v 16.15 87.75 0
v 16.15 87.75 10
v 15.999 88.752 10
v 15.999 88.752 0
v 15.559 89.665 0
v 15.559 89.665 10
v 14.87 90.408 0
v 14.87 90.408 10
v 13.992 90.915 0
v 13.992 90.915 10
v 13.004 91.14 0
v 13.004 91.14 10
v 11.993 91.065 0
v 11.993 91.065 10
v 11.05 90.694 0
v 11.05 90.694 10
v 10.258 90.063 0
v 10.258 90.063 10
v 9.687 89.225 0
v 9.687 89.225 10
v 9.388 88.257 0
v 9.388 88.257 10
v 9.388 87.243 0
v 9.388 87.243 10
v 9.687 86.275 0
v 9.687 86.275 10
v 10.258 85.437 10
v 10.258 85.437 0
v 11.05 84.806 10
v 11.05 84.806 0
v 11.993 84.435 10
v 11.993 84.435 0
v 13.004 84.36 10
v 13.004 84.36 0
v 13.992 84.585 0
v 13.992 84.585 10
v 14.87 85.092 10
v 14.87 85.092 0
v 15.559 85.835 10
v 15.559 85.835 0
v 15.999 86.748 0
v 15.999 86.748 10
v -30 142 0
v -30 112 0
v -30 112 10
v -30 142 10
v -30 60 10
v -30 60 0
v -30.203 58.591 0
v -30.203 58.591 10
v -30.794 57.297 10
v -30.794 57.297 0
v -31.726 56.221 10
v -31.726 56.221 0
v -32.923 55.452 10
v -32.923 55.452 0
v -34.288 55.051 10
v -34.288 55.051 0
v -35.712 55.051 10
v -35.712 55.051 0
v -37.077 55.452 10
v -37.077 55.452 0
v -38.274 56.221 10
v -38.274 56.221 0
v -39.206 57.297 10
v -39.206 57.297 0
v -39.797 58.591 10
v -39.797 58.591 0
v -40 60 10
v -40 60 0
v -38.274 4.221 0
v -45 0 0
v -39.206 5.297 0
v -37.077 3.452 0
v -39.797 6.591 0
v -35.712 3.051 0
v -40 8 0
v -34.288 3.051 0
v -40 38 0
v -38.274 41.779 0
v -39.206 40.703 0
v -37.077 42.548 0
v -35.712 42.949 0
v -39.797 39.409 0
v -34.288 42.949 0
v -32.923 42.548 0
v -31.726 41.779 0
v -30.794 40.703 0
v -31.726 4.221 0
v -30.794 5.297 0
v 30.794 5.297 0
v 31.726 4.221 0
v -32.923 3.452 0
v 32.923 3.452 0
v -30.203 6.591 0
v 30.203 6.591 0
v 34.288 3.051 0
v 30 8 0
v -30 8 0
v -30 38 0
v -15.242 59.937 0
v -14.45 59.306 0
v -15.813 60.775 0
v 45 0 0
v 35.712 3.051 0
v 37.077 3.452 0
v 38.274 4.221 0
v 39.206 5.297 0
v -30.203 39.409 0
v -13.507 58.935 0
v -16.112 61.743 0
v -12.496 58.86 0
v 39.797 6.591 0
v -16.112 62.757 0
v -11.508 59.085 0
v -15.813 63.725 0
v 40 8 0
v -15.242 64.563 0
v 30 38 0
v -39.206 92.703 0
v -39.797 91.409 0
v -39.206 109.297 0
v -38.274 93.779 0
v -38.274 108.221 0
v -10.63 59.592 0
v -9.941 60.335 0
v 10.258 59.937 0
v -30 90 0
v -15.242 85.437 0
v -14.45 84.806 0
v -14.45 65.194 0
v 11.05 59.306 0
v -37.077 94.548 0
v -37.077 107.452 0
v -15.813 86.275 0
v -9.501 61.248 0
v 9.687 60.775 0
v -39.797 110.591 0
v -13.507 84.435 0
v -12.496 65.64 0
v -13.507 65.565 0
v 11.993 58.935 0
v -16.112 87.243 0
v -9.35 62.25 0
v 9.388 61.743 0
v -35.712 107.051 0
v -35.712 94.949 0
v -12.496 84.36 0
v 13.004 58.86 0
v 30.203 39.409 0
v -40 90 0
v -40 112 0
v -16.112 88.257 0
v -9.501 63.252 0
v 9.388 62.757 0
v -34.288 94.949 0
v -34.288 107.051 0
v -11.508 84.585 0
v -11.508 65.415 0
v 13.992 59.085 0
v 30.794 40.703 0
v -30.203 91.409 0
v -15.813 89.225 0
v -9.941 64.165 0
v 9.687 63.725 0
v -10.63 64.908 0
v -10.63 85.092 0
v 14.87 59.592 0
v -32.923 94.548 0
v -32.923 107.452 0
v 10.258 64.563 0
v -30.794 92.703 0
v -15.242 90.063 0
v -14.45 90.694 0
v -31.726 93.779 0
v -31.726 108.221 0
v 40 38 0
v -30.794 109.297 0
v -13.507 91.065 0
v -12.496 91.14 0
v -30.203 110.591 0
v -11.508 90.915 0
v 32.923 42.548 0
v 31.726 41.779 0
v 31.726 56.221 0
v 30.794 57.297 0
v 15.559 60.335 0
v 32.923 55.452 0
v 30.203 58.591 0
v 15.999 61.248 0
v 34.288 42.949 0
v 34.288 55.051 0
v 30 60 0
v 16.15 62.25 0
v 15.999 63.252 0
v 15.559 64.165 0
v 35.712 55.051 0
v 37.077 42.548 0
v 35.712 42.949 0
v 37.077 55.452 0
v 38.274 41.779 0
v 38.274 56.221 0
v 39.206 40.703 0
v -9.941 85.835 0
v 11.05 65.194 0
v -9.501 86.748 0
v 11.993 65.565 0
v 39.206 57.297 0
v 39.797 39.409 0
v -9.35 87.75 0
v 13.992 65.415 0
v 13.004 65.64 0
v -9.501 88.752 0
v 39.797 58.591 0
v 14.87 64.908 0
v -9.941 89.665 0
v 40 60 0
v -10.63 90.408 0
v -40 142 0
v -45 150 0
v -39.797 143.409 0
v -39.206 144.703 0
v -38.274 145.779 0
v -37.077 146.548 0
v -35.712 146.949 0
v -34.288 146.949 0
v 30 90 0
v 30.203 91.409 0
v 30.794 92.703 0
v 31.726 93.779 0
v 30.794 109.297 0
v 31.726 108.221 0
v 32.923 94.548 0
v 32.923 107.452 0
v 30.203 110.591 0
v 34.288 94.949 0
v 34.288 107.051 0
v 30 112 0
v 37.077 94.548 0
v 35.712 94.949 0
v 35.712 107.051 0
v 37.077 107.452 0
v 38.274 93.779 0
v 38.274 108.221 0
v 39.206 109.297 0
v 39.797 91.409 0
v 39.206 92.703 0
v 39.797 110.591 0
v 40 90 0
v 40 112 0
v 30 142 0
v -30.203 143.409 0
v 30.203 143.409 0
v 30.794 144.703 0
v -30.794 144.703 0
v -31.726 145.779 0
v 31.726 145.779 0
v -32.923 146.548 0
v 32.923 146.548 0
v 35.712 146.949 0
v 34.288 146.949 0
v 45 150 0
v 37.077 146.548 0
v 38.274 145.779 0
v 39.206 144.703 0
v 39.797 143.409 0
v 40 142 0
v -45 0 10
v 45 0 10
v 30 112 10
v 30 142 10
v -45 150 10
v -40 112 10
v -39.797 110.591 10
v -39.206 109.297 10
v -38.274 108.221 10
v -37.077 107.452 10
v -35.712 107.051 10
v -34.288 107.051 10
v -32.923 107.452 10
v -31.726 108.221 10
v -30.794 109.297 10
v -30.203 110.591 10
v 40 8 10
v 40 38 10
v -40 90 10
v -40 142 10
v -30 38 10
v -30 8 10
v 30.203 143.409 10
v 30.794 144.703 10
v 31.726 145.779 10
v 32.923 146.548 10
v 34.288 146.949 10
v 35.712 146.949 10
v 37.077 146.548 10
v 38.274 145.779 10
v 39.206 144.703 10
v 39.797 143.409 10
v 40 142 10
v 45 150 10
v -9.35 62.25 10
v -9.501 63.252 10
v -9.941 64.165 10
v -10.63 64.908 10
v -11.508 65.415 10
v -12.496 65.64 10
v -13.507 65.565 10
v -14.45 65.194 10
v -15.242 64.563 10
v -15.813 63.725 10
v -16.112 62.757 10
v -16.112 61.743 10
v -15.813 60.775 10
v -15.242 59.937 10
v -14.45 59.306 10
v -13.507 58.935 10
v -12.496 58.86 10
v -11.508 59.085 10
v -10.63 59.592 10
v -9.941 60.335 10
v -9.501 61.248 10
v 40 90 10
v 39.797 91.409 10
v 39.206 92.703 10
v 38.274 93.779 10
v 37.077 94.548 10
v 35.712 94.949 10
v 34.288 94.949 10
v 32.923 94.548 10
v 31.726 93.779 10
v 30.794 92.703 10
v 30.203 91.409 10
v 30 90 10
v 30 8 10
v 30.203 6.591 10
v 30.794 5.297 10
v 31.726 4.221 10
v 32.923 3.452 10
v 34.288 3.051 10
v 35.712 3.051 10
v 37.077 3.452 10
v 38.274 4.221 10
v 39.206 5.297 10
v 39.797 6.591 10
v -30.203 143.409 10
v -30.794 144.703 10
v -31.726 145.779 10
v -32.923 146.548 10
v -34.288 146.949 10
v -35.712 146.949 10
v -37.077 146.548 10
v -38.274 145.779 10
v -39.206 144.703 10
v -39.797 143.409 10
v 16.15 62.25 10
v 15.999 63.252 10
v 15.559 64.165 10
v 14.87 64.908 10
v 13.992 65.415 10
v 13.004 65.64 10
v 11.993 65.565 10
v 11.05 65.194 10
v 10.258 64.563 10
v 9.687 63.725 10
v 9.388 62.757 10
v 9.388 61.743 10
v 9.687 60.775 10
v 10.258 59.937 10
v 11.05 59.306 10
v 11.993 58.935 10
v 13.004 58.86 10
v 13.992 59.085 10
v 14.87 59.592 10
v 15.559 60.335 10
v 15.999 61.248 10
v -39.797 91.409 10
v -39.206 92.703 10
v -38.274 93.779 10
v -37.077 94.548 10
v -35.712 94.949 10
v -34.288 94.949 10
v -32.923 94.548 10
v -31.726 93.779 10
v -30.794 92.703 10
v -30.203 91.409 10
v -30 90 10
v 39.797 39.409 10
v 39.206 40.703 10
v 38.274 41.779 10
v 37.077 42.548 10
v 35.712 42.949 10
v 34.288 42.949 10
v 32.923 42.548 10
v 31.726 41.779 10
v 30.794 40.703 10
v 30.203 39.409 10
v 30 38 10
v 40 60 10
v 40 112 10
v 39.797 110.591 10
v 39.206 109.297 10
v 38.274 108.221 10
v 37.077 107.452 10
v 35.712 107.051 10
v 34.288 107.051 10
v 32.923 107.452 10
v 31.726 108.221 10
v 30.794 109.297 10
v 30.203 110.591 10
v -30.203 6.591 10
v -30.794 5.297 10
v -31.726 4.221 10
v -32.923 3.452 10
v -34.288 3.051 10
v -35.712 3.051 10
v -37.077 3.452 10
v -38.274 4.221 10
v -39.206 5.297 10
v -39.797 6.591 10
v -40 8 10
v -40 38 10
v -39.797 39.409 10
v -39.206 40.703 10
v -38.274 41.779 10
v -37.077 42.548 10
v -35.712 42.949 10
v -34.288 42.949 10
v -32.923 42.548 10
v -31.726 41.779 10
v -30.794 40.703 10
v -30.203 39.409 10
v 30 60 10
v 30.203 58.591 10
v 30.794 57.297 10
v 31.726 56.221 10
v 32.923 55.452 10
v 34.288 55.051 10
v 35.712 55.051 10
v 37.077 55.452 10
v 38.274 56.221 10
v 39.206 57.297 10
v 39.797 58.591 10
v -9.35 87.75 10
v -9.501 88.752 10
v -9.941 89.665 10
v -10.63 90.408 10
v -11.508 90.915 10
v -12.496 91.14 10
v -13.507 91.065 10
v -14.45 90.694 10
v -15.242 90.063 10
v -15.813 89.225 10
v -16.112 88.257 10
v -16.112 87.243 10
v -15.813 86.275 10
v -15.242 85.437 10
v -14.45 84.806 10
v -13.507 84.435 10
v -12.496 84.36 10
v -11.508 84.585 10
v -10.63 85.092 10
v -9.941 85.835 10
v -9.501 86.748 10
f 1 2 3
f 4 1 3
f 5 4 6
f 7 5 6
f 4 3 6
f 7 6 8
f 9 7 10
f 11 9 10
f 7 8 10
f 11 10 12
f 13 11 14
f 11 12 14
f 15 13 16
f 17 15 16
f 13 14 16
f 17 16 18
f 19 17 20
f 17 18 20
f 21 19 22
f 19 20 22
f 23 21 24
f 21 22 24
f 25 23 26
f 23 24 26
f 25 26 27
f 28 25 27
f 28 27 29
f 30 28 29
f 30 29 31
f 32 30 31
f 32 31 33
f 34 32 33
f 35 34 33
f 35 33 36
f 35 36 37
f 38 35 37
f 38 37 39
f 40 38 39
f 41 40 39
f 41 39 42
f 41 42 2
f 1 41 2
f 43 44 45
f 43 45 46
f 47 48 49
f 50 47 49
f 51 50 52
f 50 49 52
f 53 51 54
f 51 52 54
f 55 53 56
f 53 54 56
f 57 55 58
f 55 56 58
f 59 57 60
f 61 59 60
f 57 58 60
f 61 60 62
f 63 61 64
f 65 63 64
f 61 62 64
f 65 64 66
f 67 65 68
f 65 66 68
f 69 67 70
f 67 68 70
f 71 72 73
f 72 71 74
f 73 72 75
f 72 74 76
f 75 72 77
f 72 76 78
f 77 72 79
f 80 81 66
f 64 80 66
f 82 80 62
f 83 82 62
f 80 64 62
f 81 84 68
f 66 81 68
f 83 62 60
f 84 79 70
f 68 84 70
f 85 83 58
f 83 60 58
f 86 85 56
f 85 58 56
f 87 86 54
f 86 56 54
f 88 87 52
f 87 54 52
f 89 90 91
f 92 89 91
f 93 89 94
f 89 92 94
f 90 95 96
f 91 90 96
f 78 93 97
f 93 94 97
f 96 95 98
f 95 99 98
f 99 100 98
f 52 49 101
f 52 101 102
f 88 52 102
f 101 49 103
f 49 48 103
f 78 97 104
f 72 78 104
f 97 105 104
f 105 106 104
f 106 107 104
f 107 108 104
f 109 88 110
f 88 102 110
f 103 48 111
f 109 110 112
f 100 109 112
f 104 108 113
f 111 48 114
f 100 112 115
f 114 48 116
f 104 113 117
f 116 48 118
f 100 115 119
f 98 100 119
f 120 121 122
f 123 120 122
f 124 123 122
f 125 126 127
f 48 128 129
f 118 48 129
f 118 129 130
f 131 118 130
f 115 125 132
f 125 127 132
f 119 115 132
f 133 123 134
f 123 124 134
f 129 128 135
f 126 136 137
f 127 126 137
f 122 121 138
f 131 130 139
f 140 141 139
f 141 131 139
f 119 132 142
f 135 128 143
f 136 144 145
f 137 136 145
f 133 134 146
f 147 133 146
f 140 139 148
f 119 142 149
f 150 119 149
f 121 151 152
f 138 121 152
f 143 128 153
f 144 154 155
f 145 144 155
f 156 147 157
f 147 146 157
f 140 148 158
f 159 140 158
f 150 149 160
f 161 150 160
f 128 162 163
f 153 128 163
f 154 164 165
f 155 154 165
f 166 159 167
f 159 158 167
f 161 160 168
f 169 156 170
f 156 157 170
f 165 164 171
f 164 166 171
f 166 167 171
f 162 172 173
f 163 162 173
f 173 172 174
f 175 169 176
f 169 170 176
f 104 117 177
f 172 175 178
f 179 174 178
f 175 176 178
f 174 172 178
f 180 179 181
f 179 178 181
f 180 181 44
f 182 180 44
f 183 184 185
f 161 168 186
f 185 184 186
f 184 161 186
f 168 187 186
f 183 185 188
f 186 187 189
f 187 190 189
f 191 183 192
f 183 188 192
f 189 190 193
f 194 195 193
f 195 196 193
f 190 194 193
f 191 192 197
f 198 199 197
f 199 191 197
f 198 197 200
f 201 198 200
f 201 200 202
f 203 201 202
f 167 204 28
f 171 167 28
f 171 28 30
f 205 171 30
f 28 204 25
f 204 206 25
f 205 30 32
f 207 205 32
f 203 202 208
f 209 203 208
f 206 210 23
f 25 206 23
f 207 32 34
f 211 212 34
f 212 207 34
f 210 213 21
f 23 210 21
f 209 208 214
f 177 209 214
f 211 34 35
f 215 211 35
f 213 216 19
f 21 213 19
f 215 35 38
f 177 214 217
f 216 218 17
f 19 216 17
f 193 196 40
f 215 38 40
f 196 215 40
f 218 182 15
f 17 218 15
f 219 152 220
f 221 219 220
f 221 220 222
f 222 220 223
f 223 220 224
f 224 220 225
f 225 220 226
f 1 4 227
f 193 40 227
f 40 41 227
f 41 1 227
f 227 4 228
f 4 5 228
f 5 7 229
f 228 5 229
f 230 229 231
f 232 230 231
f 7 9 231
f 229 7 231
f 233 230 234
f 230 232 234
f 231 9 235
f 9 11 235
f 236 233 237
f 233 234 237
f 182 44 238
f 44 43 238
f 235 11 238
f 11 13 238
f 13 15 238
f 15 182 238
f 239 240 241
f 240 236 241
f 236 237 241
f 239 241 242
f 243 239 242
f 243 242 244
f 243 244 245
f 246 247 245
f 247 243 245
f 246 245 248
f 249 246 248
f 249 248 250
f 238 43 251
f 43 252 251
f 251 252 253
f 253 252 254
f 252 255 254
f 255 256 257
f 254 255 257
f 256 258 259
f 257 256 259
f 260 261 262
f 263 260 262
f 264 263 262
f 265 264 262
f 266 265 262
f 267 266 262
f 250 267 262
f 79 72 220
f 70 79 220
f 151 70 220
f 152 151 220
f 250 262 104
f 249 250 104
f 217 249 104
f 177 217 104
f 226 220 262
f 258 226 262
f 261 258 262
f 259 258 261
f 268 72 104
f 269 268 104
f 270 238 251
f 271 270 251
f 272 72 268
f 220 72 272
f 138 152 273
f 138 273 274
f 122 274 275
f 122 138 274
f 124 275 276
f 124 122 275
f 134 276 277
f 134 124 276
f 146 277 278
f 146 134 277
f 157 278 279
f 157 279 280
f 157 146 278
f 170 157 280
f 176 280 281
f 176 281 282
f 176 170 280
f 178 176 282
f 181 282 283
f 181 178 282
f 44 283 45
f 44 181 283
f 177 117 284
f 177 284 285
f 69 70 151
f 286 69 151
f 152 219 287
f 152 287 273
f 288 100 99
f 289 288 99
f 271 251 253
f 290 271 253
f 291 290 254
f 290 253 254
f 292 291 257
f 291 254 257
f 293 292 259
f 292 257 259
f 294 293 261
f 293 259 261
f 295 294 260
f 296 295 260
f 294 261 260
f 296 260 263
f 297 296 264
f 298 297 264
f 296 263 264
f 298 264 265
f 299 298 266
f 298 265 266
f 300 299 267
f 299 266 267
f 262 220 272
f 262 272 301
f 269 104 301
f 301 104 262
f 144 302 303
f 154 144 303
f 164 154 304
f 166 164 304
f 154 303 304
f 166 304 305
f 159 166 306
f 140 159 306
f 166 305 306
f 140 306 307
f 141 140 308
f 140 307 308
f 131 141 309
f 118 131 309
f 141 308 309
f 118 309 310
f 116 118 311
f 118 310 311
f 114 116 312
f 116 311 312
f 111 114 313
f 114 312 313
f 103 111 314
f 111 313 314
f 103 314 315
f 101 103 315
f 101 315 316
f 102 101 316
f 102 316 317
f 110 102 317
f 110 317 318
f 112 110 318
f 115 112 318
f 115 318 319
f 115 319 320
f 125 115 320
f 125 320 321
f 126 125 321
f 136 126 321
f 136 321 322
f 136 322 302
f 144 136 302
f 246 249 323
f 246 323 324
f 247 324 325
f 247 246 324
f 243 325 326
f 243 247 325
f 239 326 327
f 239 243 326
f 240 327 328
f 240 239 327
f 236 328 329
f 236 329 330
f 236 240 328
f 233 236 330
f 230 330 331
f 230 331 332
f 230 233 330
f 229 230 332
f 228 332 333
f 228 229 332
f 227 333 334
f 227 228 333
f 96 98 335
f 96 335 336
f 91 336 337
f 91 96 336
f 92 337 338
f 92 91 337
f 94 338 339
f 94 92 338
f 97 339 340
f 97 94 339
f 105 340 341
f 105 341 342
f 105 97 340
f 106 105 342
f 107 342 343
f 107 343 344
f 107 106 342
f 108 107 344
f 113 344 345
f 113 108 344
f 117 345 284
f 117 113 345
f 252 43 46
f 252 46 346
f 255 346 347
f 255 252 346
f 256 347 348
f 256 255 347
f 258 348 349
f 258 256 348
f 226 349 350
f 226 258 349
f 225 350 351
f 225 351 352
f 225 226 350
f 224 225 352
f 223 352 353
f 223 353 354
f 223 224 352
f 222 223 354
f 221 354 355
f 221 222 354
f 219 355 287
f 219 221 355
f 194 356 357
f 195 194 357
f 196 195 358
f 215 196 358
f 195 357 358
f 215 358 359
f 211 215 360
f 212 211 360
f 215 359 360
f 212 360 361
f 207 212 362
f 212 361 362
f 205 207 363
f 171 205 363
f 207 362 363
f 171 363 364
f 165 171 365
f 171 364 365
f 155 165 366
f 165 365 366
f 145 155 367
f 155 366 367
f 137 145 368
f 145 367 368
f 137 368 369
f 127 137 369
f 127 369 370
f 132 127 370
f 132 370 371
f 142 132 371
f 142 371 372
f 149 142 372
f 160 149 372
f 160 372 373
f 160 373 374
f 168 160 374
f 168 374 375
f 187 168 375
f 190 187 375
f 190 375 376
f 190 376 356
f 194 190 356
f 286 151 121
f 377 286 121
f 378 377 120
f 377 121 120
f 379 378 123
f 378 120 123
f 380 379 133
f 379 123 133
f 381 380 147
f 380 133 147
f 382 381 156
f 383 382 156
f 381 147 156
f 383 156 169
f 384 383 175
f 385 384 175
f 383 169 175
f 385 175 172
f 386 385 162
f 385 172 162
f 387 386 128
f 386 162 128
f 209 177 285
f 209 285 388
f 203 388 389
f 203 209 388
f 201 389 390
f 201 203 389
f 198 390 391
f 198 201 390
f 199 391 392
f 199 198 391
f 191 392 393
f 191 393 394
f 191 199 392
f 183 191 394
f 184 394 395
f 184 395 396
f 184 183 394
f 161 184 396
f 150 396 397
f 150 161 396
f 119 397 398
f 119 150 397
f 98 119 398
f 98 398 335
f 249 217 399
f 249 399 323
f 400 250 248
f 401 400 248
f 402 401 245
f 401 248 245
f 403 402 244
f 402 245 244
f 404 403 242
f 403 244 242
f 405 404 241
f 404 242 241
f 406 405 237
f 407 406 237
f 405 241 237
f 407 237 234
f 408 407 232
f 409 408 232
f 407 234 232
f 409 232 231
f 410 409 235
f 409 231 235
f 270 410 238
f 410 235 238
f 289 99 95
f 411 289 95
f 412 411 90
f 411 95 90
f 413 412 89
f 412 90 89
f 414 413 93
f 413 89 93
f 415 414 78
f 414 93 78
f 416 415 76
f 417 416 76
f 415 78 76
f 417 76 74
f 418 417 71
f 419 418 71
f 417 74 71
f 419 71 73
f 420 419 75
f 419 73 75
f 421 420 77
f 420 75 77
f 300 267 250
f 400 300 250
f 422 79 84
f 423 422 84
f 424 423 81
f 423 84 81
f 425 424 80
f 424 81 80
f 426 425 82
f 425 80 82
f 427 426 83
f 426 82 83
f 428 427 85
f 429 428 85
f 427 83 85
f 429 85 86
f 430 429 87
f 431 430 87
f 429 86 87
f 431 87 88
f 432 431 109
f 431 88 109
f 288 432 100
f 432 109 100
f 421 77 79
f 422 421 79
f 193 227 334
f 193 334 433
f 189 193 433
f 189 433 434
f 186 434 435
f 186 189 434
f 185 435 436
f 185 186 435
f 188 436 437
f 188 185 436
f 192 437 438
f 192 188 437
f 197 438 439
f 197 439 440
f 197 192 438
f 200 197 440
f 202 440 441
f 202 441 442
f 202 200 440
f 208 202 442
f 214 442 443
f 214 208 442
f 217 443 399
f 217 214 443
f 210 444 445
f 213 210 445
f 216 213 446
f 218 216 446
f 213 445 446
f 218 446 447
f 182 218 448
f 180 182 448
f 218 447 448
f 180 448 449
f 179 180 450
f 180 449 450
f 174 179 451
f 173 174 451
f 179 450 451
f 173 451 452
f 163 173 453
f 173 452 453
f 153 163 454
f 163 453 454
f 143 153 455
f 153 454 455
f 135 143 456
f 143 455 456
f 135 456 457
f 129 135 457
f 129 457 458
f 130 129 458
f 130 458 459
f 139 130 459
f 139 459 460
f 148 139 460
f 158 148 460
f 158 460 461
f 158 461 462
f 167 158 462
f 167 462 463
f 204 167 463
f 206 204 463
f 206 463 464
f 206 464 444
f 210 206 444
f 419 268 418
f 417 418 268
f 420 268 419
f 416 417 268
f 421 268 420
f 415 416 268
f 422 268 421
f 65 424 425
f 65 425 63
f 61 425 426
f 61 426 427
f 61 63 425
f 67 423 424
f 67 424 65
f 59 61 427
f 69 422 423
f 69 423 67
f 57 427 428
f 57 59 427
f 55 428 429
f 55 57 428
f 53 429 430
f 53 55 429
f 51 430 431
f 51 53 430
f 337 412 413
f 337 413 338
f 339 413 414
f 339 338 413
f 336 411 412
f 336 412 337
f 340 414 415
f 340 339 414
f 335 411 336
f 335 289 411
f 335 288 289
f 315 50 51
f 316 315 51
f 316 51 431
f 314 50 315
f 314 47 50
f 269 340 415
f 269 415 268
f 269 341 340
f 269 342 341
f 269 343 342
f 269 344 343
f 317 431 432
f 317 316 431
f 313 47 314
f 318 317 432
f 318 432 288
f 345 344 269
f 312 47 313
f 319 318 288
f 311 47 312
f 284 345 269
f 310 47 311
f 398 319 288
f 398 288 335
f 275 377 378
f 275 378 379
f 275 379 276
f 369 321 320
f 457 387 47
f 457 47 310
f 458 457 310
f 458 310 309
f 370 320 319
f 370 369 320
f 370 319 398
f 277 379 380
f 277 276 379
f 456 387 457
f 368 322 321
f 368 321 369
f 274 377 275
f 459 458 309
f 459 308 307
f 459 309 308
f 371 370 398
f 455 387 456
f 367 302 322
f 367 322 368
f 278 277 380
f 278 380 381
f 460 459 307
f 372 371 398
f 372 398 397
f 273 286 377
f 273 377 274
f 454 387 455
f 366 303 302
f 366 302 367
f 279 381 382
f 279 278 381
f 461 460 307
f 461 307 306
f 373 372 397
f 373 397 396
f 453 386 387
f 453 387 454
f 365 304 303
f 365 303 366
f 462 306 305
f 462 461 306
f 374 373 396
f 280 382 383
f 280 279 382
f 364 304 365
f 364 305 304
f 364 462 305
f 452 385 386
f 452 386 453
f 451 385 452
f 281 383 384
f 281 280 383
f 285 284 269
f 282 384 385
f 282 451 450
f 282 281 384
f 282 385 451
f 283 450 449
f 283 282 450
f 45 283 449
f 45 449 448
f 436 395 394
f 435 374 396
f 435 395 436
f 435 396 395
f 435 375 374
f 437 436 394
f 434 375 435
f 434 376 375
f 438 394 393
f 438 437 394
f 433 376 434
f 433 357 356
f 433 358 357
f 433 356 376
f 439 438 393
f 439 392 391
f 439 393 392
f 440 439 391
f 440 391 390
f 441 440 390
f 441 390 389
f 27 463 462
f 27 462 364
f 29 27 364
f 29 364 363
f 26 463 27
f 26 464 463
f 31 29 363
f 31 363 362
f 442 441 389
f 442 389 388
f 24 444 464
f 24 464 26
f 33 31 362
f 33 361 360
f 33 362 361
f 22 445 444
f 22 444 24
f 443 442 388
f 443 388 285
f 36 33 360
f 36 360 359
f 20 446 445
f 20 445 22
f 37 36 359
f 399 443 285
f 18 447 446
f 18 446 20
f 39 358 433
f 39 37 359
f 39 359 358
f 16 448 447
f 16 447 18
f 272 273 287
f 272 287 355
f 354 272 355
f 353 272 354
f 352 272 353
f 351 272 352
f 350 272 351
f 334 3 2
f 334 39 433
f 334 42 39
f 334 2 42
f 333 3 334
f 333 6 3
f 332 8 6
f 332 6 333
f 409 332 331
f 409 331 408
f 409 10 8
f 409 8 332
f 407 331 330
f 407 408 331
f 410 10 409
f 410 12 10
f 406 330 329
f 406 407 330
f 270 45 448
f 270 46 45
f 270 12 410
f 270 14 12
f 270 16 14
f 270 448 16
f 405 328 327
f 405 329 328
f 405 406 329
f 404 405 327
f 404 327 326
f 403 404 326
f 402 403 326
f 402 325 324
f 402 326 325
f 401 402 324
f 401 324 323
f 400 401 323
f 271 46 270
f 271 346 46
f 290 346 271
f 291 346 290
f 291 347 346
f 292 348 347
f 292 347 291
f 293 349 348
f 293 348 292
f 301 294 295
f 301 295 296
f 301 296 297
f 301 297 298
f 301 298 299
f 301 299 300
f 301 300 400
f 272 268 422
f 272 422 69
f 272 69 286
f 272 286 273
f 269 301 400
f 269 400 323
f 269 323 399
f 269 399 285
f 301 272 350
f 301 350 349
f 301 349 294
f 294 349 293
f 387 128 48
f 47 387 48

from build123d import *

# Parameters (mm, degrees)
SKETCH_2_W          = 90
SKETCH_2_H          = 150
EXTRUDE_1_DEPTH     = 10
SKETCH_3_W          = 57.822110836
SKETCH_3_H          = 142.808753936
EXTRUDE_2_DEPTH     = 10
CUT_EXTRUDE_1_REACH = 12
SKETCH_10_R         = 3.4


with BuildPart() as part:
    # 草圖2 → 填料-伸長1 (new body)
    with BuildSketch(Plane.XY):
        with Locations((0, 75)):
            Rectangle(SKETCH_2_W, SKETCH_2_H)
        with BuildLine():
            Line((40, 142), (40, 112))
            ThreePointArc((40, 112), (35, 107), (30, 112))
            Line((30, 112), (30, 142))
            ThreePointArc((30, 142), (35, 147), (40, 142))
        make_face(mode=Mode.SUBTRACT)
        with BuildLine():
            Line((27, 139.5), (27, 114.5))
            ThreePointArc((27, 114.5), (23.75, 111.25), (20.5, 114.5))
            Line((20.5, 114.5), (20.5, 139.5))
            ThreePointArc((20.5, 139.5), (23.75, 142.75), (27, 139.5))
        make_face(mode=Mode.SUBTRACT)
        with BuildLine():
            Line((-40, 142), (-40, 112))
            ThreePointArc((-40, 112), (-35, 107), (-30, 112))
            Line((-30, 112), (-30, 142))
            ThreePointArc((-30, 142), (-35, 147), (-40, 142))
        make_face(mode=Mode.SUBTRACT)
        with BuildLine():
            Line((-27, 139.5), (-27, 114.5))
            ThreePointArc((-27, 114.5), (-23.75, 111.25), (-20.5, 114.5))
            Line((-20.5, 114.5), (-20.5, 139.5))
            ThreePointArc((-20.5, 139.5), (-23.75, 142.75), (-27, 139.5))
        make_face(mode=Mode.SUBTRACT)
        with BuildLine():
            Line((40, 60), (40, 90))
            ThreePointArc((40, 90), (35, 95), (30, 90))
            Line((30, 90), (30, 60))
            ThreePointArc((30, 60), (35, 55), (40, 60))
        make_face(mode=Mode.SUBTRACT)
        with BuildLine():
            Line((27, 62.5), (27, 87.5))
            ThreePointArc((27, 87.5), (23.75, 90.75), (20.5, 87.5))
            Line((20.5, 87.5), (20.5, 62.5))
            ThreePointArc((20.5, 62.5), (23.75, 59.25), (27, 62.5))
        make_face(mode=Mode.SUBTRACT)
        with BuildLine():
            Line((-40, 60), (-40, 90))
            ThreePointArc((-40, 90), (-35, 95), (-30, 90))
            Line((-30, 90), (-30, 60))
            ThreePointArc((-30, 60), (-35, 55), (-40, 60))
        make_face(mode=Mode.SUBTRACT)
        with BuildLine():
            Line((-27, 62.5), (-27, 87.5))
            ThreePointArc((-27, 87.5), (-23.75, 90.75), (-20.5, 87.5))
            Line((-20.5, 87.5), (-20.5, 62.5))
            ThreePointArc((-20.5, 62.5), (-23.75, 59.25), (-27, 62.5))
        make_face(mode=Mode.SUBTRACT)
        with BuildLine():
            Line((-40, 8), (-40, 38))
            ThreePointArc((-40, 38), (-35, 43), (-30, 38))
            Line((-30, 38), (-30, 8))
            ThreePointArc((-30, 8), (-35, 3), (-40, 8))
        make_face(mode=Mode.SUBTRACT)
        with BuildLine():
            Line((-27, 10.5), (-27, 35.5))
            ThreePointArc((-27, 35.5), (-23.75, 38.75), (-20.5, 35.5))
            Line((-20.5, 35.5), (-20.5, 10.5))
            ThreePointArc((-20.5, 10.5), (-23.75, 7.25), (-27, 10.5))
        make_face(mode=Mode.SUBTRACT)
        with BuildLine():
            Line((40, 8), (40, 38))
            ThreePointArc((40, 38), (35, 43), (30, 38))
            Line((30, 38), (30, 8))
            ThreePointArc((30, 8), (35, 3), (40, 8))
        make_face(mode=Mode.SUBTRACT)
        with BuildLine():
            Line((27, 10.5), (27, 35.5))
            ThreePointArc((27, 35.5), (23.75, 38.75), (20.5, 35.5))
            Line((20.5, 35.5), (20.5, 10.5))
            ThreePointArc((20.5, 10.5), (23.75, 7.25), (27, 10.5))
        make_face(mode=Mode.SUBTRACT)
    extrude(amount=EXTRUDE_1_DEPTH)

    # 草圖3 → 填料-伸長2 (add)
    with BuildSketch(Plane.XY.offset(10)):
        with Locations((-0.145737049, 74.293544629)):
            Rectangle(SKETCH_3_W, SKETCH_3_H)
    extrude(amount=-EXTRUDE_2_DEPTH)

    # 草圖10 → 除料-伸長1 (cut, up to next)
    with BuildSketch(Plane.XY.offset(10), mode=Mode.PRIVATE) as cut_extrude_1_sk1:
        with Locations((12.75, 62.25)):
            Circle(SKETCH_10_R)
    cut_extrude_1_tool1 = extrude(cut_extrude_1_sk1.sketch, amount=-CUT_EXTRUDE_1_REACH, mode=Mode.PRIVATE) & part.part
    add(cut_extrude_1_tool1.solids().sort_by_distance((12.75, 62.25, 10))[0], mode=Mode.SUBTRACT)
    # 草圖10 → 除料-伸長1 (cut, up to next)
    with BuildSketch(Plane.XY.offset(10), mode=Mode.PRIVATE) as cut_extrude_1_sk2:
        with Locations((-12.75, 62.25)):
            Circle(SKETCH_10_R)
    cut_extrude_1_tool2 = extrude(cut_extrude_1_sk2.sketch, amount=-CUT_EXTRUDE_1_REACH, mode=Mode.PRIVATE) & part.part
    add(cut_extrude_1_tool2.solids().sort_by_distance((-12.75, 62.25, 10))[0], mode=Mode.SUBTRACT)
    # 草圖10 → 除料-伸長1 (cut, up to next)
    with BuildSketch(Plane.XY.offset(10), mode=Mode.PRIVATE) as cut_extrude_1_sk3:
        with Locations((12.75, 87.75)):
            Circle(SKETCH_10_R)
    cut_extrude_1_tool3 = extrude(cut_extrude_1_sk3.sketch, amount=-CUT_EXTRUDE_1_REACH, mode=Mode.PRIVATE) & part.part
    add(cut_extrude_1_tool3.solids().sort_by_distance((12.75, 87.75, 10))[0], mode=Mode.SUBTRACT)
    # 草圖10 → 除料-伸長1 (cut, up to next)
    with BuildSketch(Plane.XY.offset(10), mode=Mode.PRIVATE) as cut_extrude_1_sk4:
        with Locations((-12.75, 87.75)):
            Circle(SKETCH_10_R)
    cut_extrude_1_tool4 = extrude(cut_extrude_1_sk4.sketch, amount=-CUT_EXTRUDE_1_REACH, mode=Mode.PRIVATE) & part.part
    add(cut_extrude_1_tool4.solids().sort_by_distance((-12.75, 87.75, 10))[0], mode=Mode.SUBTRACT)


solid = part.part
